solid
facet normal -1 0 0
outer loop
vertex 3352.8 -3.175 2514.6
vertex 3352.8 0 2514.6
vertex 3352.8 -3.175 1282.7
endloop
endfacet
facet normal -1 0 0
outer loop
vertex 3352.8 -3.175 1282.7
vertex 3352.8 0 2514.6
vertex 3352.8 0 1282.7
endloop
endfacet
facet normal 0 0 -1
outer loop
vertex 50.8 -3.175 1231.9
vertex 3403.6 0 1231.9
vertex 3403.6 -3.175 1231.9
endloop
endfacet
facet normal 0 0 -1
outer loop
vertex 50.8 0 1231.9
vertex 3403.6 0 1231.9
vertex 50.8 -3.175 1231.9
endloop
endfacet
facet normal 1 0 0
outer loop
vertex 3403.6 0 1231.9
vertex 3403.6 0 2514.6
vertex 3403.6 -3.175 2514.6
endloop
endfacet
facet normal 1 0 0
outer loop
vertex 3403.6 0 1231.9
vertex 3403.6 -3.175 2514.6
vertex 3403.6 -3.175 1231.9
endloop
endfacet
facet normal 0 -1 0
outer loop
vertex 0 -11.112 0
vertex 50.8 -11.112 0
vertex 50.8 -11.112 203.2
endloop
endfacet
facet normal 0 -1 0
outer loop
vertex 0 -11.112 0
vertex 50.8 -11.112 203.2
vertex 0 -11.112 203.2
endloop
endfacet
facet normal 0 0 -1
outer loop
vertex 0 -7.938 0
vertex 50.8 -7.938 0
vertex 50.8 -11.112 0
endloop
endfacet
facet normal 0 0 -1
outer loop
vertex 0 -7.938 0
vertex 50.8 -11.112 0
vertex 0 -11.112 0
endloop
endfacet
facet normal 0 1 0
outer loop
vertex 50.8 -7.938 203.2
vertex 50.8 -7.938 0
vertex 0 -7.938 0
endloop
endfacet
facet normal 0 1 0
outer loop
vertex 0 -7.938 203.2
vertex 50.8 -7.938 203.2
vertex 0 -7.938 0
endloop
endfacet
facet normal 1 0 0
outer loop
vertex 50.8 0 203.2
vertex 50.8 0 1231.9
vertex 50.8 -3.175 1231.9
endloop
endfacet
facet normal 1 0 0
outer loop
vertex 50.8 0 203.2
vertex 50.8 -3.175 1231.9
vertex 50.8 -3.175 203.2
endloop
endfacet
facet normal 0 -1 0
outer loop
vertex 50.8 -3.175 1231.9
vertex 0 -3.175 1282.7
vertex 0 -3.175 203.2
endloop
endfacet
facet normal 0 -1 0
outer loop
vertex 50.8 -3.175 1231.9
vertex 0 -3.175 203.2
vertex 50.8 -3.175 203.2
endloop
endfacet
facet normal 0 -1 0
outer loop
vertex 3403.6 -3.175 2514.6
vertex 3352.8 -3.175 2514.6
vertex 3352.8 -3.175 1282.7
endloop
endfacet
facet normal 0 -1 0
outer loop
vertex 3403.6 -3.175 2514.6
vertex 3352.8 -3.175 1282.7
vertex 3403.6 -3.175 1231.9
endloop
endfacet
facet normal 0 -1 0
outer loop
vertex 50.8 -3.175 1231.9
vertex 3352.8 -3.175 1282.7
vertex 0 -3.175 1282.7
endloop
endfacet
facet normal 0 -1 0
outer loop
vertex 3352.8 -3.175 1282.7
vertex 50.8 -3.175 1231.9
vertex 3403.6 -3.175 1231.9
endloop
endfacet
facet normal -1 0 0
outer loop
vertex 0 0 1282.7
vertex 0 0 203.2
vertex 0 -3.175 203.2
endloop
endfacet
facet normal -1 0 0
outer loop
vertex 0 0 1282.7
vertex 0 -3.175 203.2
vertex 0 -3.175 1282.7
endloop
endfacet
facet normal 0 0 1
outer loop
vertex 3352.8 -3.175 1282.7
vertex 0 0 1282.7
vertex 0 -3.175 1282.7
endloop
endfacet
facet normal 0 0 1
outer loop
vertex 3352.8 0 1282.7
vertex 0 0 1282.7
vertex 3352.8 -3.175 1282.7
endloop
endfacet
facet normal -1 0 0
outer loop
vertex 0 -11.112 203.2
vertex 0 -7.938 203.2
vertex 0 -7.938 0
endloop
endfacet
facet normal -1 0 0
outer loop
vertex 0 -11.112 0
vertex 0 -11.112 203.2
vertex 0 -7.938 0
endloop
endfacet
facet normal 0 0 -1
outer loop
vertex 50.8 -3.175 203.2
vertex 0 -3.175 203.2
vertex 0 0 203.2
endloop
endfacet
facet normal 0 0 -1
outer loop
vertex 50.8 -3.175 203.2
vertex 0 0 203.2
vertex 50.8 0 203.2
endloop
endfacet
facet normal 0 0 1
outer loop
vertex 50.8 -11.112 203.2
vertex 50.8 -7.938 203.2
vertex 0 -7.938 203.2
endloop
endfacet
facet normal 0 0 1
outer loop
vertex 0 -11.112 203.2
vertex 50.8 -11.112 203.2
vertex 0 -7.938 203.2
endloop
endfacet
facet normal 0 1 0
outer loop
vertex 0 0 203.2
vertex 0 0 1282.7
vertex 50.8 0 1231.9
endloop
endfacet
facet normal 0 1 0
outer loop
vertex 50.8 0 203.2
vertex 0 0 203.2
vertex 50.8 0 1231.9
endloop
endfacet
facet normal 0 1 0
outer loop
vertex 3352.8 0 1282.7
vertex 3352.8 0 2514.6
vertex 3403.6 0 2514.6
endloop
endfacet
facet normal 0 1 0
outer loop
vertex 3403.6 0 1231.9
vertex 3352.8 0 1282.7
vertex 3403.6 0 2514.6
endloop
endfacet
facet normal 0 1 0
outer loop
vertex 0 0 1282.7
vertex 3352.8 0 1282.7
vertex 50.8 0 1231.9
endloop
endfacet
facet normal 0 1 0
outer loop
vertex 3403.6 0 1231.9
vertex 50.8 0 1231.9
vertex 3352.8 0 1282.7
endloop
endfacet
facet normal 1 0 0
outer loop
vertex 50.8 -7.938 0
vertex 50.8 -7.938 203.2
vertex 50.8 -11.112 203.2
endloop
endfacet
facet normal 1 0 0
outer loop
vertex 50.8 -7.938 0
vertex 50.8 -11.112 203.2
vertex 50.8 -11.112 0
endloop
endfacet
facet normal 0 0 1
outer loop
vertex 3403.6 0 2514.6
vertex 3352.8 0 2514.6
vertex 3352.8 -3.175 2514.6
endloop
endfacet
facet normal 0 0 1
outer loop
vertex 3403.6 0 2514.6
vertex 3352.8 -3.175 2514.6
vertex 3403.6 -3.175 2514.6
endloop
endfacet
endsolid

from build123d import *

# Parameters (mm, degrees)
SKETCH4_W           = 50.8
SKETCH4_H           = 1231.9
SKETCH4_H_2         = 50.8
BOSS_EXTRUDE4_DEPTH = 3.175
SKETCH7_W           = 50.8
SKETCH7_H           = 203.2
CUT_EXTRUDE1_DEPTH  = 4232.750961555
SKETCH8_W           = 50.8
SKETCH8_H           = 203.2
BOSS_EXTRUDE5_DEPTH = 3.175


with BuildPart() as part:
    # Sketch4 → Boss-Extrude4 (new body)
    with BuildSketch(Plane(origin=(0, 0, 0), x_dir=(1, 0, 0), z_dir=(0, 1, 0))):
        with Locations((25.4, -615.95)):
            Rectangle(SKETCH4_W, SKETCH4_H)
        Polygon((3352.8, -1231.9), (50.8, -1231.9), (0, -1231.9), (0, -1282.7), (3352.8, -1282.7), align=None)
        with Locations((3378.2, -1257.3)):
            Rectangle(SKETCH4_W, SKETCH4_H_2)
        with Locations((3378.2, -1898.65)):
            Rectangle(SKETCH4_W, SKETCH4_H)
    extrude(amount=-BOSS_EXTRUDE4_DEPTH)

    # Sketch7 → Cut-Extrude1 (cut, through all)
    with BuildSketch(Plane.XZ.offset(3.175)):
        with Locations((25.4, 101.6)):
            Rectangle(SKETCH7_W, SKETCH7_H)
    extrude(amount=-CUT_EXTRUDE1_DEPTH, mode=Mode.SUBTRACT)


with BuildPart() as body_2:
    # Sketch8 → Boss-Extrude5 (new body)
    with BuildSketch(Plane(origin=(0, -7.9375, 0), x_dir=(-1, 0, 0), z_dir=(0, -1, 0))):
        with Locations((-25.4, -101.6)):
            Rectangle(SKETCH8_W, SKETCH8_H)
    extrude(amount=BOSS_EXTRUDE5_DEPTH)


solid = Compound([part.part, body_2.part])
